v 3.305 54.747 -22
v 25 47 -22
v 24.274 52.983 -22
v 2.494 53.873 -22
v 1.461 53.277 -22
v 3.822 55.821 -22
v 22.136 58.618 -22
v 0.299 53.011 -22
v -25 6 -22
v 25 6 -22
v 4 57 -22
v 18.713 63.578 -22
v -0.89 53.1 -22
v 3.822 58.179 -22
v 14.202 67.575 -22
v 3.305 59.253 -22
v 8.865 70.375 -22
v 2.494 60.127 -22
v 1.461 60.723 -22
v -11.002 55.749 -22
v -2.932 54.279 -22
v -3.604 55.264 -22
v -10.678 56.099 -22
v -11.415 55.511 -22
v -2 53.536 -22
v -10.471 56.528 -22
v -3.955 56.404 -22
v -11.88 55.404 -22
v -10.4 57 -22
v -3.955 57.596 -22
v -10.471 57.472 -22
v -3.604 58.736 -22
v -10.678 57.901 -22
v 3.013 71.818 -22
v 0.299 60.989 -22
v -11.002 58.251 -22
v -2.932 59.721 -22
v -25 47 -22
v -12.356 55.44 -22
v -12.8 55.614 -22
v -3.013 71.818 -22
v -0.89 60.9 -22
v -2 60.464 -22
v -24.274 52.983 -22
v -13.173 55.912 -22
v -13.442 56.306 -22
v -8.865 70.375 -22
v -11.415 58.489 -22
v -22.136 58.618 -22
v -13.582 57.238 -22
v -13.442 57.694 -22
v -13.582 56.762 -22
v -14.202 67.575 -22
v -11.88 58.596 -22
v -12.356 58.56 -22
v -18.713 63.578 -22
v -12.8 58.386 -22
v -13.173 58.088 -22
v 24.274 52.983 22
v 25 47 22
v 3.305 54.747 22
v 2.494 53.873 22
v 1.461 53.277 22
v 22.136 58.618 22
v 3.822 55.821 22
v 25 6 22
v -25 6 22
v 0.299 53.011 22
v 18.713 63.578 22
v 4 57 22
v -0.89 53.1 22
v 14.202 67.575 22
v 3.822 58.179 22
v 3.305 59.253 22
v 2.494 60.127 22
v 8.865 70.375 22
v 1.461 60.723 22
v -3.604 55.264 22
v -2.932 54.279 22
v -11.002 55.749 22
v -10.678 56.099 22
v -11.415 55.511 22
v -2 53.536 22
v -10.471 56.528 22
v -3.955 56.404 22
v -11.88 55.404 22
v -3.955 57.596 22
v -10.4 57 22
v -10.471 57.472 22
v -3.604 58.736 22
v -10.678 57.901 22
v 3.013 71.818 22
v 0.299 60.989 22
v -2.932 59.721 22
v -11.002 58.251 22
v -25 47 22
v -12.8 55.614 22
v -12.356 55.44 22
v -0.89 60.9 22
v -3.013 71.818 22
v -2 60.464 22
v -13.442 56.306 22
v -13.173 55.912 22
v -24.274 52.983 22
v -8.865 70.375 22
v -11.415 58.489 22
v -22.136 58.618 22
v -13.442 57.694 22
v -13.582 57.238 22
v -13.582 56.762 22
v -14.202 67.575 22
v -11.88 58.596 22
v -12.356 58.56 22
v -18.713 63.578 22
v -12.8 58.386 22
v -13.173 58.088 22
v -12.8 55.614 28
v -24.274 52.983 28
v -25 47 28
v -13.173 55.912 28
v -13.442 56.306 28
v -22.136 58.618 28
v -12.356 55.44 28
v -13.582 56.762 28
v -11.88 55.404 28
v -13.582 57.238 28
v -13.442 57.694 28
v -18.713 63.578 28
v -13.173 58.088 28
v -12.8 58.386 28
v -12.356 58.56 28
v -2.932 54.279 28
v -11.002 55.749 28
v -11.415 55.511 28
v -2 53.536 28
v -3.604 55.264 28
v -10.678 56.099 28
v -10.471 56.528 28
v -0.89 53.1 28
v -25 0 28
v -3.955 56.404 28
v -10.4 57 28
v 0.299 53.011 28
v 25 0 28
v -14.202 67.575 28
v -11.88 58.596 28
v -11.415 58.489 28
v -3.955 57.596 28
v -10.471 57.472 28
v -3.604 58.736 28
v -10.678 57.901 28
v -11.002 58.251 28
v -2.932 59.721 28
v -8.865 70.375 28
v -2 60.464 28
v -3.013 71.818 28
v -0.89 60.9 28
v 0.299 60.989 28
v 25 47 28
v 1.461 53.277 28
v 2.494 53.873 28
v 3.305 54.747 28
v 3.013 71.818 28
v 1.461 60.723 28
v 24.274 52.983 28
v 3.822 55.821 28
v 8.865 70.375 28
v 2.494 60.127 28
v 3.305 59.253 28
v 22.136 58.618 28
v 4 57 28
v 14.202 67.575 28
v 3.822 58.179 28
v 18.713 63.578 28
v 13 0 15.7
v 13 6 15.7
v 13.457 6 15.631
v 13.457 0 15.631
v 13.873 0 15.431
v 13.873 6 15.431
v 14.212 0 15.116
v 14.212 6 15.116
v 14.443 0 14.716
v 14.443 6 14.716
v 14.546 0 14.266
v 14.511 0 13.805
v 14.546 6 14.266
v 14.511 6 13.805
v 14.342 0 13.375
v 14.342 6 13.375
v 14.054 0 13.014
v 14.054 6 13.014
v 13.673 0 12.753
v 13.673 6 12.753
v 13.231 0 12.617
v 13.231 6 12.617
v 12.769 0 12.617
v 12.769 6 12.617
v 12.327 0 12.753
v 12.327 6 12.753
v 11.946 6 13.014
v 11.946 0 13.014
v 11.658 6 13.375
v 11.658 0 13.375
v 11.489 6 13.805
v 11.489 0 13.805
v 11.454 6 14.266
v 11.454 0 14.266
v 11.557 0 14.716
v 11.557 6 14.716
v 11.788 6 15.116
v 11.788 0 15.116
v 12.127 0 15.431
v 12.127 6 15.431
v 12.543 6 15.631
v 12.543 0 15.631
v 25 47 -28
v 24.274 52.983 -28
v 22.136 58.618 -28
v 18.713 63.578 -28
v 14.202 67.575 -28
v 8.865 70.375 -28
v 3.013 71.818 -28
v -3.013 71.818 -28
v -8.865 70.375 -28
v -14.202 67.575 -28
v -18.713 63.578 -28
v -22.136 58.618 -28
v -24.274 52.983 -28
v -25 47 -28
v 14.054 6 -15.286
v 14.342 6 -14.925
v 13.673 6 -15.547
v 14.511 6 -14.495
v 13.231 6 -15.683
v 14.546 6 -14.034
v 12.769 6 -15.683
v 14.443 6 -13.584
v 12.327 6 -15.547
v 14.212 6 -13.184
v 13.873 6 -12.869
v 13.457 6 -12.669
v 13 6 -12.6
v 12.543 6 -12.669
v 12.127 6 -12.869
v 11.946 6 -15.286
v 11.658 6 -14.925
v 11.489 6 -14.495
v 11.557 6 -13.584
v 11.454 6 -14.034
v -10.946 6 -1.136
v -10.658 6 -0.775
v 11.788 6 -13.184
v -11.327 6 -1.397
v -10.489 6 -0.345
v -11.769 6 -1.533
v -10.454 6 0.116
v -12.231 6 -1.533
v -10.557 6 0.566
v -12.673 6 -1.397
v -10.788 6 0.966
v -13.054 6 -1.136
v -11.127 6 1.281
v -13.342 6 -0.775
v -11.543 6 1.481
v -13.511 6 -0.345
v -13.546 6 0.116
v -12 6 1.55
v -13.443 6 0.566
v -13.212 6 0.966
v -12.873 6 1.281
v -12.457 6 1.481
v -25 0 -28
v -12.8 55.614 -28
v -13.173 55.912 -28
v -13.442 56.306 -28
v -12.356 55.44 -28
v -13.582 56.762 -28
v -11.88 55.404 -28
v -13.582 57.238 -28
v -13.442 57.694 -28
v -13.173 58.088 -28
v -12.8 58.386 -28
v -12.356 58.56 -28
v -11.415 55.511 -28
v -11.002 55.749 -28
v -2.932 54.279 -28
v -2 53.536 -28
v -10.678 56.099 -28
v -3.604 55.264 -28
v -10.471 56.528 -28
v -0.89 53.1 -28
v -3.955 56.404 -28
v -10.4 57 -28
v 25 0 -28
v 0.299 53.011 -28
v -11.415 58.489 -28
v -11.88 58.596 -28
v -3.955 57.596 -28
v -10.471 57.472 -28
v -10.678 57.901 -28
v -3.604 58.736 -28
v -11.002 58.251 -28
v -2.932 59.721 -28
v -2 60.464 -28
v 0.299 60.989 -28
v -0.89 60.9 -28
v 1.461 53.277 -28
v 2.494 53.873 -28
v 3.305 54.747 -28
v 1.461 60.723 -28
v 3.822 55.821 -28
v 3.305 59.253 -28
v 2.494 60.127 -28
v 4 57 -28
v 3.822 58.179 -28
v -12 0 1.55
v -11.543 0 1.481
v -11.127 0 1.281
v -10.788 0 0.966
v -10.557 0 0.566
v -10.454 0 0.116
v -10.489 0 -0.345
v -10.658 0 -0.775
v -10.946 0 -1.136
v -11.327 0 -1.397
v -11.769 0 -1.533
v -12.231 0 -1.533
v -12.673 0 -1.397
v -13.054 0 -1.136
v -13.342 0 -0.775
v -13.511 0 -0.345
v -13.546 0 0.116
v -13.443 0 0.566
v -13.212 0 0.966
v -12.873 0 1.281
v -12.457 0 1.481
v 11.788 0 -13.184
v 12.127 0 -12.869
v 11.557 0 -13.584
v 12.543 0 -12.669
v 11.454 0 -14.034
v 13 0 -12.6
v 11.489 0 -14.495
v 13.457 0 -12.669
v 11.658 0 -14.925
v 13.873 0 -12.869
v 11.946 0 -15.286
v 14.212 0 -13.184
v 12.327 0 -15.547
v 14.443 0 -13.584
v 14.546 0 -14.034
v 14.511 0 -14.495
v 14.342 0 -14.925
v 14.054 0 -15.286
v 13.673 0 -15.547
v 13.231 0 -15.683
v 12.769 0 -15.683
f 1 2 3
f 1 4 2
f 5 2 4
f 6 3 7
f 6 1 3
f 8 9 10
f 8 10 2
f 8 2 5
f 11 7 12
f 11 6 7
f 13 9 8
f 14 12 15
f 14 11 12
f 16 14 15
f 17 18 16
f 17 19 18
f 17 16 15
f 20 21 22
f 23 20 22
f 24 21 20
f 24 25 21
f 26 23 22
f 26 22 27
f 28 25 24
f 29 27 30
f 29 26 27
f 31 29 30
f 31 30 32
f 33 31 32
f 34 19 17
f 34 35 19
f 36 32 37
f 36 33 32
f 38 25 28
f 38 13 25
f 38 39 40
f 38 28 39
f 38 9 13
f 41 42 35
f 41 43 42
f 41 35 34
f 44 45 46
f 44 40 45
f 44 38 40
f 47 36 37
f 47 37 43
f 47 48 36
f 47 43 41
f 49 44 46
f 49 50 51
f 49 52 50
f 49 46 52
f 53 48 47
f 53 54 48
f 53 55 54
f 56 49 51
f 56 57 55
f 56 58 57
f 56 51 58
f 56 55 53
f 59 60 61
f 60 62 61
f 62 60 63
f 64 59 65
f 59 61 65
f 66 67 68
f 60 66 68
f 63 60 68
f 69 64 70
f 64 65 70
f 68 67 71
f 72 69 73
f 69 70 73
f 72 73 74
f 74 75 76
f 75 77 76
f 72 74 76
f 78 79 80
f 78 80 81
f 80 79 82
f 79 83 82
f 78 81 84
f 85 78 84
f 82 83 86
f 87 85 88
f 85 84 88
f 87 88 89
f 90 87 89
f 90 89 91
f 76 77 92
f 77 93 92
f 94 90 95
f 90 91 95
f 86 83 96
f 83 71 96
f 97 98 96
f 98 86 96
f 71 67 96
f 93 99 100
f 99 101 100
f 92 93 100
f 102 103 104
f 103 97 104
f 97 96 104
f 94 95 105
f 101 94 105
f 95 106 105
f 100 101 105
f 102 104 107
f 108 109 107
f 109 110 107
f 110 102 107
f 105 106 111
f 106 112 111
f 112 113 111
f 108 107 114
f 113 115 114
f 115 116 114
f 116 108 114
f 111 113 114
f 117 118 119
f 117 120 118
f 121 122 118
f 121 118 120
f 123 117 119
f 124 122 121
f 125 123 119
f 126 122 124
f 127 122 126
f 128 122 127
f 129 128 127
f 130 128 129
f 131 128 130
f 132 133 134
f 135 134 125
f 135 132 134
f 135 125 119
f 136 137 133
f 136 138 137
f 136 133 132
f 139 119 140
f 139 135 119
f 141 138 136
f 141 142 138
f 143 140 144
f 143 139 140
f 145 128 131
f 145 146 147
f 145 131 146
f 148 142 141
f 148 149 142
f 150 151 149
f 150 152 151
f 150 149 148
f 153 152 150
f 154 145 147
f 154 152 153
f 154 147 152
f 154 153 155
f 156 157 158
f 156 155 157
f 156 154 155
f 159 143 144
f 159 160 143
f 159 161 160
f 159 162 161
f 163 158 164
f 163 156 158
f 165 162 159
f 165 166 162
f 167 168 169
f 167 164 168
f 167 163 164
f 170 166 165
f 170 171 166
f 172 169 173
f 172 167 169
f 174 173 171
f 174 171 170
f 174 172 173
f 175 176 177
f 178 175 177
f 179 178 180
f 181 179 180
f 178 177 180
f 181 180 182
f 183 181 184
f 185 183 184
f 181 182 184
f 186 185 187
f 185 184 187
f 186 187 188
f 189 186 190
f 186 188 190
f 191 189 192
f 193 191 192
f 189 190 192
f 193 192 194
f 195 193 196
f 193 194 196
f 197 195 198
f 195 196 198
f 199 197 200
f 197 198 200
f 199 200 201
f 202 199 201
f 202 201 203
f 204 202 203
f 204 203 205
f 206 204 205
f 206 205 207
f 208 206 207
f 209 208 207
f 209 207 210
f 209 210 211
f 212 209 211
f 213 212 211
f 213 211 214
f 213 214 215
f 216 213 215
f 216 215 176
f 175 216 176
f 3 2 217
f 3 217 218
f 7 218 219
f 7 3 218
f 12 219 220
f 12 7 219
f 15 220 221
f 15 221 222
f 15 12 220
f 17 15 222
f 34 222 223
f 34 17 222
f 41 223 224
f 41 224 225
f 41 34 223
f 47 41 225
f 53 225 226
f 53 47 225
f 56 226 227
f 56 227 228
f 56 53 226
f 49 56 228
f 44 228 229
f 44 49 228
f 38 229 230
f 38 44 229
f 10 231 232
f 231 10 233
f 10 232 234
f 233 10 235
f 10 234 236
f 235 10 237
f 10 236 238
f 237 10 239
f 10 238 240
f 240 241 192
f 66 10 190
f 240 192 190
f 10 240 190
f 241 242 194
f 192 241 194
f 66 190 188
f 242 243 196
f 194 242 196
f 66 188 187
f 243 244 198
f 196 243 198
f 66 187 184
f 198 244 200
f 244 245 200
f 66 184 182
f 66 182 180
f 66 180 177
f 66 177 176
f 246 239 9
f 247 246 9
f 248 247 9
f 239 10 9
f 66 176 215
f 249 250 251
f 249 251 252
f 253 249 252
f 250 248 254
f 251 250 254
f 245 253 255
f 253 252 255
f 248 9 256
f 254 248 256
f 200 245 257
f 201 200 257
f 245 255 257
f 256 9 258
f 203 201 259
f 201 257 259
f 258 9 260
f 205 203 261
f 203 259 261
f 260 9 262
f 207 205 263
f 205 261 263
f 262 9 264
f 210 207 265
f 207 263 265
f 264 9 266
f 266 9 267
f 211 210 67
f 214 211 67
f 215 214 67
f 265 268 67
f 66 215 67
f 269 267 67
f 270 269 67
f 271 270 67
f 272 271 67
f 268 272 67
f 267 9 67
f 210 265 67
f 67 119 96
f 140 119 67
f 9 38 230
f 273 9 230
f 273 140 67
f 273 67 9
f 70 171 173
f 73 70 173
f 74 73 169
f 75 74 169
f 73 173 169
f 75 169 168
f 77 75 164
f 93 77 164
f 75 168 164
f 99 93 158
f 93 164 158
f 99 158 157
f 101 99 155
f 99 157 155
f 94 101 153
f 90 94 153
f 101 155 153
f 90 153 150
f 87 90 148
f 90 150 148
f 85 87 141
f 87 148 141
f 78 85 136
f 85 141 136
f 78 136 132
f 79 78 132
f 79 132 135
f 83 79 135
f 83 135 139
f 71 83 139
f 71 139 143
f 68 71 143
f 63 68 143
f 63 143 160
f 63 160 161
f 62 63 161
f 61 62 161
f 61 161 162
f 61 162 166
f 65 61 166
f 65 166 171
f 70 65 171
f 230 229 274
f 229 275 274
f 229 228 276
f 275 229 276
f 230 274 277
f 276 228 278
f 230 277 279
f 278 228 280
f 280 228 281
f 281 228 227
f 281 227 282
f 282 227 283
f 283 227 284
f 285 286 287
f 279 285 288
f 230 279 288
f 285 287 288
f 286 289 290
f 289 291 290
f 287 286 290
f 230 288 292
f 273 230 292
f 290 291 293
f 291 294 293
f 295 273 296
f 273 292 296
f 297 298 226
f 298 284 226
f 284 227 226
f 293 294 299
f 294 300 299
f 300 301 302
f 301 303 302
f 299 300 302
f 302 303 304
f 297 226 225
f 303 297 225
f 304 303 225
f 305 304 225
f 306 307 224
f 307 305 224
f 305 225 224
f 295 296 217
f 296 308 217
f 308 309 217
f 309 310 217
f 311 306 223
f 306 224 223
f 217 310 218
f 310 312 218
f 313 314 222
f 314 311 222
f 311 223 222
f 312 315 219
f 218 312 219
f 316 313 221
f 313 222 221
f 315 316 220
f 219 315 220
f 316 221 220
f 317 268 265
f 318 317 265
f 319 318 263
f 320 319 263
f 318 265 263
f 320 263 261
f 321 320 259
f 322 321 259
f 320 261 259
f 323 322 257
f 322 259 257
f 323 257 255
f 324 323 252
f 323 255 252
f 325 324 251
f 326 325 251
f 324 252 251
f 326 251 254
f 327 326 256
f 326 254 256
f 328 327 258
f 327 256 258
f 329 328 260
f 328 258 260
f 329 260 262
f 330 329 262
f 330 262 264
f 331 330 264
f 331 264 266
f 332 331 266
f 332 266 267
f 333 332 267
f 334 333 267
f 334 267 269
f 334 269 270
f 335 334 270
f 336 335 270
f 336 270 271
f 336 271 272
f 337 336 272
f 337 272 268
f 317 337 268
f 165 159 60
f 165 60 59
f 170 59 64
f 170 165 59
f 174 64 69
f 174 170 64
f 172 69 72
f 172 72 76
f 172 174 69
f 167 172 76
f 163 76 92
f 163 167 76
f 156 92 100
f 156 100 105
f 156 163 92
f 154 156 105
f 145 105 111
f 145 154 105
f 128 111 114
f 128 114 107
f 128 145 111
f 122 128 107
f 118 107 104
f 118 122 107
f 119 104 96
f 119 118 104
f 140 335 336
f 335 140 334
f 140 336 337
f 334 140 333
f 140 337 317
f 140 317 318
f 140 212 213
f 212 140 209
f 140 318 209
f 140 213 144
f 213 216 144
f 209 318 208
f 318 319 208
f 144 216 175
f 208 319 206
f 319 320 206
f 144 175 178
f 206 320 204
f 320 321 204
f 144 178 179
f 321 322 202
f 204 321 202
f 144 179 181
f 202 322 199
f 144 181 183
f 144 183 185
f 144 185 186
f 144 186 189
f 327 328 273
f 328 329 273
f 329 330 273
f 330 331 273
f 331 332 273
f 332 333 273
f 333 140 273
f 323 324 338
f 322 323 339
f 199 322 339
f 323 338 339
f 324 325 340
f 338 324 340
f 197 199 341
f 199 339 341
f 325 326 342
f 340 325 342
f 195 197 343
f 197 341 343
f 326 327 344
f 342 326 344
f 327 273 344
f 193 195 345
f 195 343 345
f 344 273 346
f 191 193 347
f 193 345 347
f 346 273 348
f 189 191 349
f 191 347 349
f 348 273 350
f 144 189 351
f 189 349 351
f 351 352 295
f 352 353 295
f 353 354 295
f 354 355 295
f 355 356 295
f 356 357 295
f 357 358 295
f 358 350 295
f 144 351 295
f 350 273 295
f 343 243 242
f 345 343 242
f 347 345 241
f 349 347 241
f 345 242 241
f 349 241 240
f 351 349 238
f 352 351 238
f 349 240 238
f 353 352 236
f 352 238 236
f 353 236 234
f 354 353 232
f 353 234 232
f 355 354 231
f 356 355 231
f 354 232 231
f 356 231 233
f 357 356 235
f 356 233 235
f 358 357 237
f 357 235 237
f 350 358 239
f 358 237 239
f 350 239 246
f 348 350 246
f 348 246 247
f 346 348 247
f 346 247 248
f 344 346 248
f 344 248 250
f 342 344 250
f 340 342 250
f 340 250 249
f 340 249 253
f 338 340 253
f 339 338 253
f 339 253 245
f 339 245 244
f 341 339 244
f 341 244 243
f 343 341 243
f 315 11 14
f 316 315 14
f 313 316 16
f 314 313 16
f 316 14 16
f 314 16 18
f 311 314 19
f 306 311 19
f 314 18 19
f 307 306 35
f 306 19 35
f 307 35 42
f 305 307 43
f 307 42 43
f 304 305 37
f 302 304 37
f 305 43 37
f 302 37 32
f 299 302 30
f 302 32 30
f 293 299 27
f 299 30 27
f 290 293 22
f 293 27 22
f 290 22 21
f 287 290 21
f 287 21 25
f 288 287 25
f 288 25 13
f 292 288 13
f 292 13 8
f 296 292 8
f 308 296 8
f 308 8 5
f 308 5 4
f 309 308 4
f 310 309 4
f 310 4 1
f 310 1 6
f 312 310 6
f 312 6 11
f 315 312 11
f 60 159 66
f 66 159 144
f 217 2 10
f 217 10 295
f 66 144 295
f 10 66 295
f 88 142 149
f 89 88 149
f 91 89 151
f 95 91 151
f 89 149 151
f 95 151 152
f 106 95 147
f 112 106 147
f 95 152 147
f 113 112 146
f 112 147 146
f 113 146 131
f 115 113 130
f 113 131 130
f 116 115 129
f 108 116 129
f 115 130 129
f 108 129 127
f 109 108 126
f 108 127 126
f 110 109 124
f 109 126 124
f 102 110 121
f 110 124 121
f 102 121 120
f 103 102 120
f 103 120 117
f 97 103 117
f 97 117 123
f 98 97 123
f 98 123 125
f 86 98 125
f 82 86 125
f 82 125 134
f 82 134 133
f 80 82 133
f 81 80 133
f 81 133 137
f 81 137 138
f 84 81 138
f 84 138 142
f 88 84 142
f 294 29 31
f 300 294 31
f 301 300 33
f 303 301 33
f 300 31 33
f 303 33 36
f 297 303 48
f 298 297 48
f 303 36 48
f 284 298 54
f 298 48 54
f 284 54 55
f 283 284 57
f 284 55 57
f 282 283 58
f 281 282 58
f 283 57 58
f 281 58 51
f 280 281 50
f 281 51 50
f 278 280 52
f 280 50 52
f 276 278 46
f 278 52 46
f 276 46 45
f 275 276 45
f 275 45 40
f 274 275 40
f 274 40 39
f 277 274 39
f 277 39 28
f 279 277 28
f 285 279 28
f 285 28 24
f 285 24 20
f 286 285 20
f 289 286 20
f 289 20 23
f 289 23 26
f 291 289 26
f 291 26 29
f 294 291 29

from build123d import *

# Parameters (mm, degrees)
CROQUIS1_W              = 50
CROQUIS1_H              = 56
SALIENTE_EXTRUIR1_DEPTH = 47
SALIENTE_EXTRUIR2_DEPTH = 56
CROQUIS3_W              = 44
CROQUIS3_H              = 69.477636763
CORTAR_EXTRUIR1_DEPTH   = 93.021736563
CROQUIS4_R              = 4
CROQUIS4_R_2            = 1.6
CORTAR_EXTRUIR2_DEPTH   = 95.578010129
CROQUIS5_R              = 1.55
CORTAR_EXTRUIR3_DEPTH   = 76.927597091


with BuildPart() as part:
    # Croquis1 → Saliente-Extruir1 (new body)
    with BuildSketch(Plane(origin=(0, 0, 0), x_dir=(1, 0, 0), z_dir=(0, 1, 0))):
        Rectangle(CROQUIS1_W, CROQUIS1_H)
    extrude(amount=SALIENTE_EXTRUIR1_DEPTH)

    # Croquis2 → Saliente-Extruir2 (add)
    with BuildSketch(Plane.XY.offset(28)):
        with BuildLine():
            Line((-25, 47), (25, 47))
            ThreePointArc((25, 47), (0, 72), (-25, 47))
        make_face()
    extrude(amount=-SALIENTE_EXTRUIR2_DEPTH)

    # Croquis3 → Cortar-Extruir1 (cut, through all)
    with BuildSketch(Plane.ZY.offset(25)):
        with Locations((0, 40.738818382)):
            Rectangle(CROQUIS3_W, CROQUIS3_H)
    extrude(amount=-CORTAR_EXTRUIR1_DEPTH, mode=Mode.SUBTRACT)

    # Croquis4 → Cortar-Extruir2 (cut, through all)
    with BuildSketch(Plane.XY.offset(28)):
        with Locations((0, 57)):
            Circle(CROQUIS4_R)
        with Locations((-12, 57)):
            Circle(CROQUIS4_R_2)
    extrude(amount=-CORTAR_EXTRUIR2_DEPTH, mode=Mode.SUBTRACT)

    # Croquis5 → Cortar-Extruir3 (cut, through all)
    with BuildSketch(Plane(origin=(0, 6, 0), x_dir=(1, 0, 0), z_dir=(0, 1, 0))):
        with Locations(Location((13, -14.15, 0), (0, 0, 270))):
            Circle(CROQUIS5_R)
        with Locations(Location((13, 14.15, 0), (0, 0, 270))):
            Circle(CROQUIS5_R)
        with Locations(Location((-12, 0, 0), (0, 0, 270))):
            Circle(CROQUIS5_R)
    extrude(amount=-CORTAR_EXTRUIR3_DEPTH, mode=Mode.SUBTRACT)


solid = part.part
